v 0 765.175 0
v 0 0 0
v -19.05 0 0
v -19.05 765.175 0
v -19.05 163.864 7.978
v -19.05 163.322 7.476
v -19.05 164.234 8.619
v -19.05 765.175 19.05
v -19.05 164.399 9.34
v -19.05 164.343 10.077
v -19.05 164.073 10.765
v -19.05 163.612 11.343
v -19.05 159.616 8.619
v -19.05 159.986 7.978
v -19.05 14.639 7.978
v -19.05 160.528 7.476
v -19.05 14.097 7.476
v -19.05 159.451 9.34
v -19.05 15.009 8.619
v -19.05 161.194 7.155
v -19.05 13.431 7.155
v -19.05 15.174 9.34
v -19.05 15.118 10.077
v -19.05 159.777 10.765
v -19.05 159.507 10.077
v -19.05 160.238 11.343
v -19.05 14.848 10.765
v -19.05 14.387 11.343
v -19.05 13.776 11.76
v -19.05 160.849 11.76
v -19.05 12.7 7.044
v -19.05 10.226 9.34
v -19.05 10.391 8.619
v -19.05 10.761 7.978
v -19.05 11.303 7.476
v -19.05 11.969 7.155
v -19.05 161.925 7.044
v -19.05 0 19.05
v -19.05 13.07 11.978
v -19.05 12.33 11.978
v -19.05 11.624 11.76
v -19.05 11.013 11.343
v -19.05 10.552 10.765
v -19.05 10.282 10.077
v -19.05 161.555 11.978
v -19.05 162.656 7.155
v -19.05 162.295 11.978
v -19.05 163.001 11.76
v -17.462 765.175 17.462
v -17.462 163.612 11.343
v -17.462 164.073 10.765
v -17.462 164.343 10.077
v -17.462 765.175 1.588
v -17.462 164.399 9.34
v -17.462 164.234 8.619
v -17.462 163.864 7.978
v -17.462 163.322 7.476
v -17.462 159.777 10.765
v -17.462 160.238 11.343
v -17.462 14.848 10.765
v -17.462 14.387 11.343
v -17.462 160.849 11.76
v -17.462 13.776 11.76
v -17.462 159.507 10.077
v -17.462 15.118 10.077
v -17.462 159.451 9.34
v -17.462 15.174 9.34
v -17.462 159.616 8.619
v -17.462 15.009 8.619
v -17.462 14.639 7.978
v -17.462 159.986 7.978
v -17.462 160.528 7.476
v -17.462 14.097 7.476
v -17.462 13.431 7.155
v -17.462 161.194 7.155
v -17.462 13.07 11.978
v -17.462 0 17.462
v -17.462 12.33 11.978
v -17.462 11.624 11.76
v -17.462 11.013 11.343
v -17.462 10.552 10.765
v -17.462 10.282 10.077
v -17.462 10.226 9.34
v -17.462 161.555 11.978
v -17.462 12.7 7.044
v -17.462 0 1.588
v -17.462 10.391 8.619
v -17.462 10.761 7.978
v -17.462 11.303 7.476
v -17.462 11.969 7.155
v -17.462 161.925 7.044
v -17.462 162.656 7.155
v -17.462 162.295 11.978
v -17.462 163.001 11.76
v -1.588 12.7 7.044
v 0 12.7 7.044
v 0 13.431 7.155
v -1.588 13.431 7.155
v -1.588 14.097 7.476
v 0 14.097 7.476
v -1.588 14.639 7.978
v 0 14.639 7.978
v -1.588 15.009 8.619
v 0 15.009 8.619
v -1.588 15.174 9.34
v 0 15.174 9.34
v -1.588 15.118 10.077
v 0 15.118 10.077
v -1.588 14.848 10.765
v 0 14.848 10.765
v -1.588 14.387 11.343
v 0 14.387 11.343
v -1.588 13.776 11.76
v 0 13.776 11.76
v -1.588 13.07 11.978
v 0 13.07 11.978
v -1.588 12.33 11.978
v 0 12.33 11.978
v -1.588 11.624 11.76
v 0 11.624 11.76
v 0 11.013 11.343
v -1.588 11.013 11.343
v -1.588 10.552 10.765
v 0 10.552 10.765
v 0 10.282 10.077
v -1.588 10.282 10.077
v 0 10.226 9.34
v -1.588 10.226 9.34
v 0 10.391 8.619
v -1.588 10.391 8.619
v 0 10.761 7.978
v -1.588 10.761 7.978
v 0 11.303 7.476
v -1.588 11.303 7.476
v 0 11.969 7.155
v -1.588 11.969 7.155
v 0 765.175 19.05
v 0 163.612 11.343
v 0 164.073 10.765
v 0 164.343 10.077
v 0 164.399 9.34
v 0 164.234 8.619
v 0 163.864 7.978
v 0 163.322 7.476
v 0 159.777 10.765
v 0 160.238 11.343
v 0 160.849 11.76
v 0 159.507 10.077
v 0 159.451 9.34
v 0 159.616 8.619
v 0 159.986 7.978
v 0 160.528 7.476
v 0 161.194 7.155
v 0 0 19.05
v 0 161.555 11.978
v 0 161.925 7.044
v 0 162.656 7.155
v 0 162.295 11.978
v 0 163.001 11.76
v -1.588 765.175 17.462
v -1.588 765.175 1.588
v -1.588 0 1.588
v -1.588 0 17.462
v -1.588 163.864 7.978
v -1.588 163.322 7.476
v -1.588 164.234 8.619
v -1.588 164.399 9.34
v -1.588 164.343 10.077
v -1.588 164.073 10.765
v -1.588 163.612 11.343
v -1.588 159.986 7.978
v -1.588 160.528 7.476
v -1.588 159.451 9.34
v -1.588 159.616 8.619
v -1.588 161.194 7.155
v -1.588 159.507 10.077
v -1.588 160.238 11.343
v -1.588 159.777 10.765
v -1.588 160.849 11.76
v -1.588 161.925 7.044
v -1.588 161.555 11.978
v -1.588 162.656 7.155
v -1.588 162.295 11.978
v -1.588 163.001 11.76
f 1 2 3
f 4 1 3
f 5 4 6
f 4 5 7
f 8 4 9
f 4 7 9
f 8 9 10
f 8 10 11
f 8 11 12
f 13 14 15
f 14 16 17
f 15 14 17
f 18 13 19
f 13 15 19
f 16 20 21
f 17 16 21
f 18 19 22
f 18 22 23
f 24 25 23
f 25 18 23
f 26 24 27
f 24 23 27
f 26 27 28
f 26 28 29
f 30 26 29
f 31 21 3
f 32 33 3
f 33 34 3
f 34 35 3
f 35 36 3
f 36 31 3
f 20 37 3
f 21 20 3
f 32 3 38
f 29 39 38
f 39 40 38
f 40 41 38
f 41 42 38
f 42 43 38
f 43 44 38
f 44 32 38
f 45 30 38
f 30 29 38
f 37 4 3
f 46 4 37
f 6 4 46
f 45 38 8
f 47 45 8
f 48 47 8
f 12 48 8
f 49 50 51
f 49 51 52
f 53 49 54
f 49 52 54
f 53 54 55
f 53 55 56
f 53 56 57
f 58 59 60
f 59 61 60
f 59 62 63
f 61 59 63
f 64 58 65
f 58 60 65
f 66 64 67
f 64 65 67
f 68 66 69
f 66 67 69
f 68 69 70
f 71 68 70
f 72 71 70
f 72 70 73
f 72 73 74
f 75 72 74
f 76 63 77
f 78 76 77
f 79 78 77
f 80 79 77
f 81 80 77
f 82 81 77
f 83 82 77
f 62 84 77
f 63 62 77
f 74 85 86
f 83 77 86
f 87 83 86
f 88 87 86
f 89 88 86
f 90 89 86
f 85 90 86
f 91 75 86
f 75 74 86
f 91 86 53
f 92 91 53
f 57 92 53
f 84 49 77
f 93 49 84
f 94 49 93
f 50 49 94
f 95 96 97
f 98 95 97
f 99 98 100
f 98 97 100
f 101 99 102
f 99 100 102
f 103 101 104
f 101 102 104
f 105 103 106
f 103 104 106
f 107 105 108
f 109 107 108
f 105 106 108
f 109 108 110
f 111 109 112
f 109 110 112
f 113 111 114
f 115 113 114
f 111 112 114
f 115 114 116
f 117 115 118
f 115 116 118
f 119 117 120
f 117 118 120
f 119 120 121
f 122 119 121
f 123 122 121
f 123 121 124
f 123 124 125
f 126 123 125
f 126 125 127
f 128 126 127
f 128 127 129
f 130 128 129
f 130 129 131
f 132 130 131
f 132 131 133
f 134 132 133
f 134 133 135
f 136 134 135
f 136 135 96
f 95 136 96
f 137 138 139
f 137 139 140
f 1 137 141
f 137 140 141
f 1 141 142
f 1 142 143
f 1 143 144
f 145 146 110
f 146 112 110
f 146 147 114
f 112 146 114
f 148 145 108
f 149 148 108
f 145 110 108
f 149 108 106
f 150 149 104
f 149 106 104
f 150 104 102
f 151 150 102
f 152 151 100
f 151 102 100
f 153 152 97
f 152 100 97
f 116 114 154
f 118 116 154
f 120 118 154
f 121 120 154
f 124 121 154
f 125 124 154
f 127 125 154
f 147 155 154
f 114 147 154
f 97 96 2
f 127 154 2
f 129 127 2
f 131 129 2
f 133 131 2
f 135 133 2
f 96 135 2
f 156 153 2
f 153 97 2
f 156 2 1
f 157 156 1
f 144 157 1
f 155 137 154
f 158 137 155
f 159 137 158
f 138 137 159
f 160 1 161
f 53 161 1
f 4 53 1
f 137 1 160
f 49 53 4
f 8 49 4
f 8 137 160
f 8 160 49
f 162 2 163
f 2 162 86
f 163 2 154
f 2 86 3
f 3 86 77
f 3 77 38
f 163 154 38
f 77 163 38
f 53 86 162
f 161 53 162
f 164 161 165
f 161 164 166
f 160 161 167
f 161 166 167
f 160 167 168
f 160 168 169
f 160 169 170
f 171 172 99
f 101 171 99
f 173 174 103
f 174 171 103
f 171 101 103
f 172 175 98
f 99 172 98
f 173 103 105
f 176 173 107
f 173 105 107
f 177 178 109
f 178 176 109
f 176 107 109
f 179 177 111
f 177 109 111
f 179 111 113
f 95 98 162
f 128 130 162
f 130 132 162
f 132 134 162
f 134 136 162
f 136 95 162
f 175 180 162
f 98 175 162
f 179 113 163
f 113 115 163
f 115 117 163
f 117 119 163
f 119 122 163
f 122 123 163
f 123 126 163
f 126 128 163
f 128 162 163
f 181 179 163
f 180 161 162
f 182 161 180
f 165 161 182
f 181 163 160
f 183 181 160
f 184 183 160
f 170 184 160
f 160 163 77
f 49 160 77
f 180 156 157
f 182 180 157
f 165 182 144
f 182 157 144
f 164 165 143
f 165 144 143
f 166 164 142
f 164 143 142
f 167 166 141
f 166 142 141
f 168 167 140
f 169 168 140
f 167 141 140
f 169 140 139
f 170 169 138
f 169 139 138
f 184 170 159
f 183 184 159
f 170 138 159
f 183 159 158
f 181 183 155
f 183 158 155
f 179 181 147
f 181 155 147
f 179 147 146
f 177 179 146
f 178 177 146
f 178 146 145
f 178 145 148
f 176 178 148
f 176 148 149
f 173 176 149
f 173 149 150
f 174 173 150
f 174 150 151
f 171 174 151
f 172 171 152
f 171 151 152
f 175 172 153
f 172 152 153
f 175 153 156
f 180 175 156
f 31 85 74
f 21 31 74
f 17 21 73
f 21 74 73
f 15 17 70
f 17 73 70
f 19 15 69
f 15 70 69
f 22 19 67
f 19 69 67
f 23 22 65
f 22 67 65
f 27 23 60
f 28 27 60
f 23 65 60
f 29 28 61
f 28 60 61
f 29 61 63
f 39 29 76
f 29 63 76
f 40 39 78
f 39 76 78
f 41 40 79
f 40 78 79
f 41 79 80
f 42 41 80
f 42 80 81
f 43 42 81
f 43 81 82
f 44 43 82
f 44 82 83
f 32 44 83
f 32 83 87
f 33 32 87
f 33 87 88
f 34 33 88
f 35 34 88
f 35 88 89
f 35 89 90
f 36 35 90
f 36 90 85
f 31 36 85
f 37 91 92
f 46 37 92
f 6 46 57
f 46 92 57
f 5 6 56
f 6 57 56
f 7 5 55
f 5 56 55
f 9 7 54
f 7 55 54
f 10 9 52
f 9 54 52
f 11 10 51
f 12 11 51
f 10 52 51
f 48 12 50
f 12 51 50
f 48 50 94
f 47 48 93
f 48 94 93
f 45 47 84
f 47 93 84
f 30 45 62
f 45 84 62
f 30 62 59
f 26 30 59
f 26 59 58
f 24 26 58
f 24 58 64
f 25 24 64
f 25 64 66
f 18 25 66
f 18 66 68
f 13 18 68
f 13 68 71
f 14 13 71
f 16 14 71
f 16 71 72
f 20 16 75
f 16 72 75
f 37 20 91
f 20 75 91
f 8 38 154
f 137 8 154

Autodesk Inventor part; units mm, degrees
ref_plane "YZ Plane" through (0, 0, 0) normal (1, 0, 0) x (0, 1, 0)
ref_plane "XZ Plane" through (0, 0, 0) normal (0, 1, 0) x (-1, 0, 0)
ref_plane "XY Plane" through (0, 0, 0) normal (0, 0, 1) x (1, 0, 0)
sketch "Sketch1" plane through (0, 0, 0) normal (0, 1, 0) x (-1, 0, 0)
  line L0 (0, 0) -> (19.05, 0)
  line L1 (19.05, 0) -> (19.05, 19.05)
  line L2 (19.05, 19.05) -> (0, 19.05)
  line L3 (0, 19.05) -> (0, 0)
  line L4 (1.5875, 17.4625) -> (17.4625, 17.4625)
  line L5 (17.4625, 17.4625) -> (17.4625, 1.5875)
  line L6 (17.4625, 1.5875) -> (1.5875, 1.5875)
  line L7 (1.5875, 1.5875) -> (1.5875, 17.4625)
  dimension "d0" = 19.05
  dimension "sqAlumWidth" = 19.05
  dimension "sqAlumWallThickness" = 1.5875
  dimension "d3" = 1.5875
  dimension "d4" = 1.5875
  dimension "d5" = 1.5875
extrude "Extrusion1" add sketch "Sketch1" along normal blind 765.175
sketch "Sketch2" plane through (0, 0, 19.05) normal (1, 0, 0) x (0, 0, -1)
  line L0 (0, 0) -> (19.05, 0) projected
  line L1 (19.05, 0) -> (19.05, 765.175) projected
  circle A0 centre (9.525, 12.7) radius 2.4805
  circle A1 centre (9.525, 161.925) radius 2.4805
  dimension "d8" = 4.9609
  dimension "d9" = 149.225
  dimension "screwDistanceFromBottom" = 12.7
  dimension "d11" = 9.525
extrude "Extrusion2" cut sketch "Sketch2" against normal through all
equation "\"d0\" = sqAlumWidth"
equation "\"d3\" = sqAlumWallThickness"
equation "\"d4\" = sqAlumWallThickness"
equation "\"d5\" = sqAlumWallThickness"
equation "\"d6\" = heightAboveTv + largeScrewDistance + topLargeScrewDistanceFromTop + screwDistanceFromBottom"
equation "\"d8\" = largeScrewDiameter"
equation "\"d9\" = largeScrewDistance"
equation "\"d11\" = 0.5 * sqAlumWidth"
equation "\"heightAboveTv\" = 304.8"
equation "\"largeScrewDistance\" = 149.225"
equation "\"topLargeScrewDistanceFromTop\" = 298.45"
equation "\"largeScrewDiameter\" = 4.960938"
properties part number "arm-vertical"
